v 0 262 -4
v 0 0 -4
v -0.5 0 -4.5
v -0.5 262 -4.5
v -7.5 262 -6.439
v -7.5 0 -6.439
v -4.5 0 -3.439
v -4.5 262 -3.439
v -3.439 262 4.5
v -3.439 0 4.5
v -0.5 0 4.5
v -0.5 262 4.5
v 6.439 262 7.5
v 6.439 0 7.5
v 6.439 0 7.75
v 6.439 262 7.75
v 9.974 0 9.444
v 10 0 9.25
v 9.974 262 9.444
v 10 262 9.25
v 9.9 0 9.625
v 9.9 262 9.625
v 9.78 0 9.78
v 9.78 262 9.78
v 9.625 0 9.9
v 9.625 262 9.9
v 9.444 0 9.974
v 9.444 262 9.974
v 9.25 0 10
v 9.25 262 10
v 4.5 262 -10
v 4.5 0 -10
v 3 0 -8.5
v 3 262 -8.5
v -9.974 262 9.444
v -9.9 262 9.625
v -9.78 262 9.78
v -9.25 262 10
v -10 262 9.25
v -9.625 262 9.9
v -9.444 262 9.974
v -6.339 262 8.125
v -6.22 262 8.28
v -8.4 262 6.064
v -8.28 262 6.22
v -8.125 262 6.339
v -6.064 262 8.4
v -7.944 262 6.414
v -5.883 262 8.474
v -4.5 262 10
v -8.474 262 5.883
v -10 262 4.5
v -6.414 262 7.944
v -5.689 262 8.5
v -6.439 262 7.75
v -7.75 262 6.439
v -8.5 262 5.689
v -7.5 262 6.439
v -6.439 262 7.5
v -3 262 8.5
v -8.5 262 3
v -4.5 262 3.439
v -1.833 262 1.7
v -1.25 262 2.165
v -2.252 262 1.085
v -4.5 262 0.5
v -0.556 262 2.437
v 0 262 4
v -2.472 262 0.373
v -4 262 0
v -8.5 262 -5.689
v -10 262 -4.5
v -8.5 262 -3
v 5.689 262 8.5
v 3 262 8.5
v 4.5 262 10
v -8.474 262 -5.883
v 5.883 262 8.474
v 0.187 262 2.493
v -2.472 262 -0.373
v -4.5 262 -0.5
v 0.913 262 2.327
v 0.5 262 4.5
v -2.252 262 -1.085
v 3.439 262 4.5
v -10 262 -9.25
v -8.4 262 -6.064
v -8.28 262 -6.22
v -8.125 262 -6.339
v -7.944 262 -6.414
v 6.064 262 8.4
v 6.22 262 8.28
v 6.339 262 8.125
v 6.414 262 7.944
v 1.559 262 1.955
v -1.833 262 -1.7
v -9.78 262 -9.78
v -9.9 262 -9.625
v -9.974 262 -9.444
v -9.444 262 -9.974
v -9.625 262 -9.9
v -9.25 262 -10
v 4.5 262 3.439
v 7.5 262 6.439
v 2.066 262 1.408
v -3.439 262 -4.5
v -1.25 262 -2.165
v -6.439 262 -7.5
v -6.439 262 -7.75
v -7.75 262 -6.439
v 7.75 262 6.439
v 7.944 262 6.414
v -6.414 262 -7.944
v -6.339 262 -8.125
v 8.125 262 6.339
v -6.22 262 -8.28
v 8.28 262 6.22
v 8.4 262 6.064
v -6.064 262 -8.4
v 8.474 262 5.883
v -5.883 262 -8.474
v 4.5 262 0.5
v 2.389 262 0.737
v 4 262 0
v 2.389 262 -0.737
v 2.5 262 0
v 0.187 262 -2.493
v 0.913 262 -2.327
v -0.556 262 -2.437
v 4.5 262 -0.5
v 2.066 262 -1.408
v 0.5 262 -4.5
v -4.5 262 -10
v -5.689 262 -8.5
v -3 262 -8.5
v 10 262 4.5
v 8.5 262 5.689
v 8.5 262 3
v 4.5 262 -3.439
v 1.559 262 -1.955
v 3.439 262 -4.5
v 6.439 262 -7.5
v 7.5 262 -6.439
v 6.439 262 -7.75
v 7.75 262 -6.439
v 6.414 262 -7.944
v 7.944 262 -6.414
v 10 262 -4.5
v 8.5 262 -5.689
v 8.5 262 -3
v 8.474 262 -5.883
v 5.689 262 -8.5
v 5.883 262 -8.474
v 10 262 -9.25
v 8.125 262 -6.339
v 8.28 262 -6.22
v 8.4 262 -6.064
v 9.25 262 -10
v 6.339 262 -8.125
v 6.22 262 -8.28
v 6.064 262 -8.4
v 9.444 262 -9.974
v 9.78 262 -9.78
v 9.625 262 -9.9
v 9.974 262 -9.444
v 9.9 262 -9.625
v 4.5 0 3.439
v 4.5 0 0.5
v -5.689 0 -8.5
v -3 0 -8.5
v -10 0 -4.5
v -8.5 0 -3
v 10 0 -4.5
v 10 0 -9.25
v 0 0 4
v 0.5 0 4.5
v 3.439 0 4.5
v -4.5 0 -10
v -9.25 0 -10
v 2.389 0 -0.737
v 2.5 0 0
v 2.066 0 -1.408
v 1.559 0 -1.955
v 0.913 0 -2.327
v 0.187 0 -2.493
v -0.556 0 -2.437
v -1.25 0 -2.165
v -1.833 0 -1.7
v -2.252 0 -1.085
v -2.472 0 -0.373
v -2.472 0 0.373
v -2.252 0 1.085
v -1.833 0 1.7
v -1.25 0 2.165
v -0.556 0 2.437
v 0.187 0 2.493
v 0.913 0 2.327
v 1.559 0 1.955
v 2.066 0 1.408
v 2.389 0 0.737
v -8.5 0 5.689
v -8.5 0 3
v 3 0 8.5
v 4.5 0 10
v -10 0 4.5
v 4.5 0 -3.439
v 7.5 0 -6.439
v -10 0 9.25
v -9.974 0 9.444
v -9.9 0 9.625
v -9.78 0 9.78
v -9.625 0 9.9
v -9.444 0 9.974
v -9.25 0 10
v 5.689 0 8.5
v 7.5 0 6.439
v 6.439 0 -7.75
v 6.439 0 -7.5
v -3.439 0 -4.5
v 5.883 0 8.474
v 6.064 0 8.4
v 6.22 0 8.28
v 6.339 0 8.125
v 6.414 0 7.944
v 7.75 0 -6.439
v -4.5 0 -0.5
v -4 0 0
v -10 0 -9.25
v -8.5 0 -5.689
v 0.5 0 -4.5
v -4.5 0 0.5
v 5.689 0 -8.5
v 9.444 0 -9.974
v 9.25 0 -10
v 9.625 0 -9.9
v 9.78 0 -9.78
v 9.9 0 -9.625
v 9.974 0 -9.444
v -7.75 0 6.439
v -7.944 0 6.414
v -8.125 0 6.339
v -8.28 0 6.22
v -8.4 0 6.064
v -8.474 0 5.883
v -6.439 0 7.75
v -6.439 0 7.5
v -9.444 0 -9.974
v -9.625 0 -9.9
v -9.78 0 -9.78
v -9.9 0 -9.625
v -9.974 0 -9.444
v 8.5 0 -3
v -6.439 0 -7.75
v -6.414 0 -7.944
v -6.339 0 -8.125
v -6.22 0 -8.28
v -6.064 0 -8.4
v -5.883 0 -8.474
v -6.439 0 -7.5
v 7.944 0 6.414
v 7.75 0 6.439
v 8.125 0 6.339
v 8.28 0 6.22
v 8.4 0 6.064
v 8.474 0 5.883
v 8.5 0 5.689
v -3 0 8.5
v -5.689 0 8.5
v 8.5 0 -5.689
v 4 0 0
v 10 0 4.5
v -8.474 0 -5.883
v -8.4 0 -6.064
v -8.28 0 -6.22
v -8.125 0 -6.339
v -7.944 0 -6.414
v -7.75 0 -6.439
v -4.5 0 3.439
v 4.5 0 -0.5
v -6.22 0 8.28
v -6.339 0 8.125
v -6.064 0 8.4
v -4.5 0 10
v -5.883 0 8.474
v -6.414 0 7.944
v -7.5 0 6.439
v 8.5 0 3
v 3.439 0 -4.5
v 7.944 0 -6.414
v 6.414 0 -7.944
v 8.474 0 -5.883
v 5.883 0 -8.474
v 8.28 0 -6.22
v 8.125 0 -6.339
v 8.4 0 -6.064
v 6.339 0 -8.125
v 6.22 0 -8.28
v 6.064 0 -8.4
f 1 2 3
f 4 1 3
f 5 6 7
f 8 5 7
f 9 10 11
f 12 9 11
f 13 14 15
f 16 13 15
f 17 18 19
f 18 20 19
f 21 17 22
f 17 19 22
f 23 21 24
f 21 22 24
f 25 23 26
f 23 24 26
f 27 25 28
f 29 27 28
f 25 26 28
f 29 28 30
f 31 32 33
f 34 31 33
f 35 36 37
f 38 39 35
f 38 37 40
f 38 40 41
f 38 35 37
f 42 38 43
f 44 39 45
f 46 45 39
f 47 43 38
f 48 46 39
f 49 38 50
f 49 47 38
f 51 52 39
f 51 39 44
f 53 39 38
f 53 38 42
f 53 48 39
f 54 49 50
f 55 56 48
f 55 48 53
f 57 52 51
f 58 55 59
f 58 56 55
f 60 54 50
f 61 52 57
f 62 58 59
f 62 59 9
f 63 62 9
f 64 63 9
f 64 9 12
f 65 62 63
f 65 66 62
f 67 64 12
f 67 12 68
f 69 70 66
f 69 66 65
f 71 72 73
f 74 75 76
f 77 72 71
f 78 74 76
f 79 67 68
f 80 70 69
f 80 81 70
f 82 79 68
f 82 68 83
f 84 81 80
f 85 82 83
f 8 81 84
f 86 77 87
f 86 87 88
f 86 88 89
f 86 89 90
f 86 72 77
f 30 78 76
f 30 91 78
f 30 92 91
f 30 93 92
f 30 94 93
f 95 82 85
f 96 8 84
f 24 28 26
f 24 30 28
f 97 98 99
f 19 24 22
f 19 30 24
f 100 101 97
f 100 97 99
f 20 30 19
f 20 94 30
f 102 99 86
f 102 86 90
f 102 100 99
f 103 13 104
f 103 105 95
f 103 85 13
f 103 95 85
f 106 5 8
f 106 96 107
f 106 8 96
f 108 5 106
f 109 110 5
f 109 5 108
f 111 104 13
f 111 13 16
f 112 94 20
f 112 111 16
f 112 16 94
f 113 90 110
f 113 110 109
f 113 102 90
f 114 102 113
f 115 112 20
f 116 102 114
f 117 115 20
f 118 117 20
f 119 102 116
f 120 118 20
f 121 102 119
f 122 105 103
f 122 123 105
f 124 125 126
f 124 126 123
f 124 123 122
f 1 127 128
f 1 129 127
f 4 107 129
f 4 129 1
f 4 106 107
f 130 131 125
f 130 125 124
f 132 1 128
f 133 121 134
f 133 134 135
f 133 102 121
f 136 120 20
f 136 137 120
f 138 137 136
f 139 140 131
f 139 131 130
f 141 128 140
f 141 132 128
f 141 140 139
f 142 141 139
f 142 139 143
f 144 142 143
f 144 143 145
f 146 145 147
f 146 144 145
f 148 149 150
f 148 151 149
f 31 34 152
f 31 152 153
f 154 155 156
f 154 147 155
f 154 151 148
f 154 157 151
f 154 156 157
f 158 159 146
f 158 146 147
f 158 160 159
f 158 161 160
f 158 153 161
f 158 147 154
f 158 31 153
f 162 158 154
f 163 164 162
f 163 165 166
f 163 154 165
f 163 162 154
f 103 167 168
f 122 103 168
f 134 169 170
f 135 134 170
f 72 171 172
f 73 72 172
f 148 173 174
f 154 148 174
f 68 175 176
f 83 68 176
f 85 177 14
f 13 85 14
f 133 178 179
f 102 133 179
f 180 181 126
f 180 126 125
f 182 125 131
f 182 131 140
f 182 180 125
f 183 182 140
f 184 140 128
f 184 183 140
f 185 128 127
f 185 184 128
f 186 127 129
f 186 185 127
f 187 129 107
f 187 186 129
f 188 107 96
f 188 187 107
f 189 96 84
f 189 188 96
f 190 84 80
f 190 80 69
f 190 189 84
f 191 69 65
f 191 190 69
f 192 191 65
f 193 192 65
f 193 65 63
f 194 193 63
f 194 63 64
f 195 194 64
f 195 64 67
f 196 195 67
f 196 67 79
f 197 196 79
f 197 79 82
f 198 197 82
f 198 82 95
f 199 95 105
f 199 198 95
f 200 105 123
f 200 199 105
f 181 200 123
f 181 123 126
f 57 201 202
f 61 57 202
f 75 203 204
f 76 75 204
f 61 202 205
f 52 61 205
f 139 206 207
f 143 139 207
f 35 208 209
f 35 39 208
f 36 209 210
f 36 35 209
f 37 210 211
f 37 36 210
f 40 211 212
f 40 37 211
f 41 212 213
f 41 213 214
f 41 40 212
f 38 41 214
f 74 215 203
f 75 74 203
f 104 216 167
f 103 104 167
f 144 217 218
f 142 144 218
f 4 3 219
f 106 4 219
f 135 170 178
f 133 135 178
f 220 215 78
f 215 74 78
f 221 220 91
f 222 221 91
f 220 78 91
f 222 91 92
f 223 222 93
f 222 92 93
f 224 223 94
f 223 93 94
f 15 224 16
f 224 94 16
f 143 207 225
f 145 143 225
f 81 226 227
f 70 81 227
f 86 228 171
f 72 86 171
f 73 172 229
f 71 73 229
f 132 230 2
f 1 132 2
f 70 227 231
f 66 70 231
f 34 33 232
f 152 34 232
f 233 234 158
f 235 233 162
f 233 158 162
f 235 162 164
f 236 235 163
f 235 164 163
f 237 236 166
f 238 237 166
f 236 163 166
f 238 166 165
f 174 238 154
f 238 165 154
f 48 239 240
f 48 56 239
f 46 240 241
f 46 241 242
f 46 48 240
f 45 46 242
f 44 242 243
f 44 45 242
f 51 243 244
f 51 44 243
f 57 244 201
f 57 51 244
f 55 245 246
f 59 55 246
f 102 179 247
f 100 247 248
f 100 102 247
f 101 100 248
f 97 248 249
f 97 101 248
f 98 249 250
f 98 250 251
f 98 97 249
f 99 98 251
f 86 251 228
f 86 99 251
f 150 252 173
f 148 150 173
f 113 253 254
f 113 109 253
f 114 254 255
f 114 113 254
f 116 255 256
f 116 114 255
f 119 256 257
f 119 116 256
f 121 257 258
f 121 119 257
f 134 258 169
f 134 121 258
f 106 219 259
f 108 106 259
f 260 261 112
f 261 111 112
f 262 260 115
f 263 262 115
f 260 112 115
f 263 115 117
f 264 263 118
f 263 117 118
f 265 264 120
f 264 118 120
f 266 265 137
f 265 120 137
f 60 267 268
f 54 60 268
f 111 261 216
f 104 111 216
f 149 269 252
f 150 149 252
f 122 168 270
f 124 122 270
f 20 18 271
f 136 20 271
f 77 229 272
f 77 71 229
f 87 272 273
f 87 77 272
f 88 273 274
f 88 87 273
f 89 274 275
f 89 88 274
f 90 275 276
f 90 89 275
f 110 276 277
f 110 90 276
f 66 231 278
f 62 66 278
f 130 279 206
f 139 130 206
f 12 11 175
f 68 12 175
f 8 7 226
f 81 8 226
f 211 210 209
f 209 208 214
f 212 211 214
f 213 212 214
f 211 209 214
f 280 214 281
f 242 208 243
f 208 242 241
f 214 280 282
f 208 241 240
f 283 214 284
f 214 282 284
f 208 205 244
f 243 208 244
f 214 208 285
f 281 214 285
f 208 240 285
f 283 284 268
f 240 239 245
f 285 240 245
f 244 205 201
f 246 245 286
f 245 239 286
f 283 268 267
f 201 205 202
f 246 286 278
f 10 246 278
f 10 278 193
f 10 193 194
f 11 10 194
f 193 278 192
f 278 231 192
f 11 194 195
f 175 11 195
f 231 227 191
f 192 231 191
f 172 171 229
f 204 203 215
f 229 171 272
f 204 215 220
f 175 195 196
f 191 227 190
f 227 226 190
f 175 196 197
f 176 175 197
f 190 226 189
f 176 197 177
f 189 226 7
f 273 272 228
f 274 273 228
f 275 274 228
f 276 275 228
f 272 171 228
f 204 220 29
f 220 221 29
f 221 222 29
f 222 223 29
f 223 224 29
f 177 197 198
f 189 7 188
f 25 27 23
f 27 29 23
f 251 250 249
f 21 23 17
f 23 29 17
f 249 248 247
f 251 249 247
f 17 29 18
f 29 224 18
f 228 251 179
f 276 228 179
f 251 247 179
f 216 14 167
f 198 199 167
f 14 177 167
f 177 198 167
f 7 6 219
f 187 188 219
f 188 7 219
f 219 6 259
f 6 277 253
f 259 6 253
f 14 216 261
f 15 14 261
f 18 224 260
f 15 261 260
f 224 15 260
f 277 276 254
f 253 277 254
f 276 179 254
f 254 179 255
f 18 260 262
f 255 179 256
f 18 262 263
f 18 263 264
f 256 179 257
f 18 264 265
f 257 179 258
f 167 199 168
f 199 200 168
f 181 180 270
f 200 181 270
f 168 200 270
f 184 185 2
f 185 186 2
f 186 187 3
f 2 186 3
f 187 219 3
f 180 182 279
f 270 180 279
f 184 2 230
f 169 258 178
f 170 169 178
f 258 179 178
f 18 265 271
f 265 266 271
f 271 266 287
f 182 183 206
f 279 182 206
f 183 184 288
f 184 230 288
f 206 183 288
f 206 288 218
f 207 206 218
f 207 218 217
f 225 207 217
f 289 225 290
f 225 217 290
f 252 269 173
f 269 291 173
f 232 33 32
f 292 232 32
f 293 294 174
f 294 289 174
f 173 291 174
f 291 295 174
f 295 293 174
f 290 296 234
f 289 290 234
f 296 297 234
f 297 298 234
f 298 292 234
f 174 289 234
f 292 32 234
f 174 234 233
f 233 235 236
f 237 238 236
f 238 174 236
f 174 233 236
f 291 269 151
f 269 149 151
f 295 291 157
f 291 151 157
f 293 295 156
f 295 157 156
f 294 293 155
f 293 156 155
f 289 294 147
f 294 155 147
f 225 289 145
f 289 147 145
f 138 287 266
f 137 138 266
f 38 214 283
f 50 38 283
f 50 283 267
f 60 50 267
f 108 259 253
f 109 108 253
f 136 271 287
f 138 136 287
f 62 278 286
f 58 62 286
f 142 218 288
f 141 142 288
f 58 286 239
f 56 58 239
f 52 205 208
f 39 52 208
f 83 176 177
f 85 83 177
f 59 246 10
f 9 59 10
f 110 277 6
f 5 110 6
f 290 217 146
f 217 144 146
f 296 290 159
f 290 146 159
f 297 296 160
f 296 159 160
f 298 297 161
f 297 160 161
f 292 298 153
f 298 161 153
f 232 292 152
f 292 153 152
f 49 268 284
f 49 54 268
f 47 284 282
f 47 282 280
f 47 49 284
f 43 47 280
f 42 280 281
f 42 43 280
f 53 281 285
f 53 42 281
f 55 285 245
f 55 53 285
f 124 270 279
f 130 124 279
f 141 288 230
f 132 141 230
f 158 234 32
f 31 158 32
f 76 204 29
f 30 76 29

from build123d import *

# Parameters (mm, degrees)
ESQUISSE1_R      = 2.5
EXTRUSION1_DEPTH = 262
CONG_1_R         = 0.75


with BuildPart() as part:
    # Esquisse1 → Extrusion1 (new body)
    with BuildSketch(Plane(origin=(0, 0, 0), x_dir=(1, 0, 0), z_dir=(0, 1, 0))):
        Polygon((0, 4), (-0.5, 4.5), (-3.439339828, 4.5), (-6.439339828, 7.5), (-6.439339828, 8.5), (-3, 8.5), (-4.5, 10), (-10, 10), (-10, 4.5), (-8.5, 3), (-8.5, 6.439339828), (-7.5, 6.439339828), (-4.5, 3.439339828), (-4.5, 0.5), (-4, 0), (-4.5, -0.5), (-4.5, -3.439339828), (-7.5, -6.439339828), (-8.5, -6.439339828), (-8.5, -3), (-10, -4.5), (-10, -10), (-4.5, -10), (-3, -8.5), (-6.439339828, -8.5), (-6.439339828, -7.5), (-3.439339828, -4.5), (-0.5, -4.5), (0, -4), (0.5, -4.5), (3.439339828, -4.5), (6.439339828, -7.5), (6.439339828, -8.5), (3, -8.5), (4.5, -10), (10, -10), (10, -4.5), (8.5, -3), (8.5, -6.439339828), (7.5, -6.439339828), (4.5, -3.439339828), (4.5, -0.5), (4, 0), (4.5, 0.5), (4.5, 3.439339828), (7.5, 6.439339828), (8.5, 6.439339828), (8.5, 3), (10, 4.5), (10, 10), (4.5, 10), (3, 8.5), (6.439339828, 8.5), (6.439339828, 7.5), (3.439339828, 4.5), (0.5, 4.5), align=None)
        Circle(ESQUISSE1_R, mode=Mode.SUBTRACT)
    extrude(amount=EXTRUSION1_DEPTH)

    # Congé1
    cong_1_edges = [part.edges().sort_by_distance(p)[0] for p in [
        (6.439339828, 131, -8.5),
        (10, 131, -10),
        (8.5, 131, -6.439339828),
        (8.5, 131, 6.439339828),
        (10, 131, 10),
        (6.439339828, 131, 8.5),
        (-6.439339828, 131, 8.5),
        (-10, 131, 10),
        (-8.5, 131, 6.439339828),
        (-8.5, 131, -6.439339828),
        (-10, 131, -10),
        (-6.439339828, 131, -8.5),
    ]]
    fillet(cong_1_edges, radius=CONG_1_R)


solid = part.part
